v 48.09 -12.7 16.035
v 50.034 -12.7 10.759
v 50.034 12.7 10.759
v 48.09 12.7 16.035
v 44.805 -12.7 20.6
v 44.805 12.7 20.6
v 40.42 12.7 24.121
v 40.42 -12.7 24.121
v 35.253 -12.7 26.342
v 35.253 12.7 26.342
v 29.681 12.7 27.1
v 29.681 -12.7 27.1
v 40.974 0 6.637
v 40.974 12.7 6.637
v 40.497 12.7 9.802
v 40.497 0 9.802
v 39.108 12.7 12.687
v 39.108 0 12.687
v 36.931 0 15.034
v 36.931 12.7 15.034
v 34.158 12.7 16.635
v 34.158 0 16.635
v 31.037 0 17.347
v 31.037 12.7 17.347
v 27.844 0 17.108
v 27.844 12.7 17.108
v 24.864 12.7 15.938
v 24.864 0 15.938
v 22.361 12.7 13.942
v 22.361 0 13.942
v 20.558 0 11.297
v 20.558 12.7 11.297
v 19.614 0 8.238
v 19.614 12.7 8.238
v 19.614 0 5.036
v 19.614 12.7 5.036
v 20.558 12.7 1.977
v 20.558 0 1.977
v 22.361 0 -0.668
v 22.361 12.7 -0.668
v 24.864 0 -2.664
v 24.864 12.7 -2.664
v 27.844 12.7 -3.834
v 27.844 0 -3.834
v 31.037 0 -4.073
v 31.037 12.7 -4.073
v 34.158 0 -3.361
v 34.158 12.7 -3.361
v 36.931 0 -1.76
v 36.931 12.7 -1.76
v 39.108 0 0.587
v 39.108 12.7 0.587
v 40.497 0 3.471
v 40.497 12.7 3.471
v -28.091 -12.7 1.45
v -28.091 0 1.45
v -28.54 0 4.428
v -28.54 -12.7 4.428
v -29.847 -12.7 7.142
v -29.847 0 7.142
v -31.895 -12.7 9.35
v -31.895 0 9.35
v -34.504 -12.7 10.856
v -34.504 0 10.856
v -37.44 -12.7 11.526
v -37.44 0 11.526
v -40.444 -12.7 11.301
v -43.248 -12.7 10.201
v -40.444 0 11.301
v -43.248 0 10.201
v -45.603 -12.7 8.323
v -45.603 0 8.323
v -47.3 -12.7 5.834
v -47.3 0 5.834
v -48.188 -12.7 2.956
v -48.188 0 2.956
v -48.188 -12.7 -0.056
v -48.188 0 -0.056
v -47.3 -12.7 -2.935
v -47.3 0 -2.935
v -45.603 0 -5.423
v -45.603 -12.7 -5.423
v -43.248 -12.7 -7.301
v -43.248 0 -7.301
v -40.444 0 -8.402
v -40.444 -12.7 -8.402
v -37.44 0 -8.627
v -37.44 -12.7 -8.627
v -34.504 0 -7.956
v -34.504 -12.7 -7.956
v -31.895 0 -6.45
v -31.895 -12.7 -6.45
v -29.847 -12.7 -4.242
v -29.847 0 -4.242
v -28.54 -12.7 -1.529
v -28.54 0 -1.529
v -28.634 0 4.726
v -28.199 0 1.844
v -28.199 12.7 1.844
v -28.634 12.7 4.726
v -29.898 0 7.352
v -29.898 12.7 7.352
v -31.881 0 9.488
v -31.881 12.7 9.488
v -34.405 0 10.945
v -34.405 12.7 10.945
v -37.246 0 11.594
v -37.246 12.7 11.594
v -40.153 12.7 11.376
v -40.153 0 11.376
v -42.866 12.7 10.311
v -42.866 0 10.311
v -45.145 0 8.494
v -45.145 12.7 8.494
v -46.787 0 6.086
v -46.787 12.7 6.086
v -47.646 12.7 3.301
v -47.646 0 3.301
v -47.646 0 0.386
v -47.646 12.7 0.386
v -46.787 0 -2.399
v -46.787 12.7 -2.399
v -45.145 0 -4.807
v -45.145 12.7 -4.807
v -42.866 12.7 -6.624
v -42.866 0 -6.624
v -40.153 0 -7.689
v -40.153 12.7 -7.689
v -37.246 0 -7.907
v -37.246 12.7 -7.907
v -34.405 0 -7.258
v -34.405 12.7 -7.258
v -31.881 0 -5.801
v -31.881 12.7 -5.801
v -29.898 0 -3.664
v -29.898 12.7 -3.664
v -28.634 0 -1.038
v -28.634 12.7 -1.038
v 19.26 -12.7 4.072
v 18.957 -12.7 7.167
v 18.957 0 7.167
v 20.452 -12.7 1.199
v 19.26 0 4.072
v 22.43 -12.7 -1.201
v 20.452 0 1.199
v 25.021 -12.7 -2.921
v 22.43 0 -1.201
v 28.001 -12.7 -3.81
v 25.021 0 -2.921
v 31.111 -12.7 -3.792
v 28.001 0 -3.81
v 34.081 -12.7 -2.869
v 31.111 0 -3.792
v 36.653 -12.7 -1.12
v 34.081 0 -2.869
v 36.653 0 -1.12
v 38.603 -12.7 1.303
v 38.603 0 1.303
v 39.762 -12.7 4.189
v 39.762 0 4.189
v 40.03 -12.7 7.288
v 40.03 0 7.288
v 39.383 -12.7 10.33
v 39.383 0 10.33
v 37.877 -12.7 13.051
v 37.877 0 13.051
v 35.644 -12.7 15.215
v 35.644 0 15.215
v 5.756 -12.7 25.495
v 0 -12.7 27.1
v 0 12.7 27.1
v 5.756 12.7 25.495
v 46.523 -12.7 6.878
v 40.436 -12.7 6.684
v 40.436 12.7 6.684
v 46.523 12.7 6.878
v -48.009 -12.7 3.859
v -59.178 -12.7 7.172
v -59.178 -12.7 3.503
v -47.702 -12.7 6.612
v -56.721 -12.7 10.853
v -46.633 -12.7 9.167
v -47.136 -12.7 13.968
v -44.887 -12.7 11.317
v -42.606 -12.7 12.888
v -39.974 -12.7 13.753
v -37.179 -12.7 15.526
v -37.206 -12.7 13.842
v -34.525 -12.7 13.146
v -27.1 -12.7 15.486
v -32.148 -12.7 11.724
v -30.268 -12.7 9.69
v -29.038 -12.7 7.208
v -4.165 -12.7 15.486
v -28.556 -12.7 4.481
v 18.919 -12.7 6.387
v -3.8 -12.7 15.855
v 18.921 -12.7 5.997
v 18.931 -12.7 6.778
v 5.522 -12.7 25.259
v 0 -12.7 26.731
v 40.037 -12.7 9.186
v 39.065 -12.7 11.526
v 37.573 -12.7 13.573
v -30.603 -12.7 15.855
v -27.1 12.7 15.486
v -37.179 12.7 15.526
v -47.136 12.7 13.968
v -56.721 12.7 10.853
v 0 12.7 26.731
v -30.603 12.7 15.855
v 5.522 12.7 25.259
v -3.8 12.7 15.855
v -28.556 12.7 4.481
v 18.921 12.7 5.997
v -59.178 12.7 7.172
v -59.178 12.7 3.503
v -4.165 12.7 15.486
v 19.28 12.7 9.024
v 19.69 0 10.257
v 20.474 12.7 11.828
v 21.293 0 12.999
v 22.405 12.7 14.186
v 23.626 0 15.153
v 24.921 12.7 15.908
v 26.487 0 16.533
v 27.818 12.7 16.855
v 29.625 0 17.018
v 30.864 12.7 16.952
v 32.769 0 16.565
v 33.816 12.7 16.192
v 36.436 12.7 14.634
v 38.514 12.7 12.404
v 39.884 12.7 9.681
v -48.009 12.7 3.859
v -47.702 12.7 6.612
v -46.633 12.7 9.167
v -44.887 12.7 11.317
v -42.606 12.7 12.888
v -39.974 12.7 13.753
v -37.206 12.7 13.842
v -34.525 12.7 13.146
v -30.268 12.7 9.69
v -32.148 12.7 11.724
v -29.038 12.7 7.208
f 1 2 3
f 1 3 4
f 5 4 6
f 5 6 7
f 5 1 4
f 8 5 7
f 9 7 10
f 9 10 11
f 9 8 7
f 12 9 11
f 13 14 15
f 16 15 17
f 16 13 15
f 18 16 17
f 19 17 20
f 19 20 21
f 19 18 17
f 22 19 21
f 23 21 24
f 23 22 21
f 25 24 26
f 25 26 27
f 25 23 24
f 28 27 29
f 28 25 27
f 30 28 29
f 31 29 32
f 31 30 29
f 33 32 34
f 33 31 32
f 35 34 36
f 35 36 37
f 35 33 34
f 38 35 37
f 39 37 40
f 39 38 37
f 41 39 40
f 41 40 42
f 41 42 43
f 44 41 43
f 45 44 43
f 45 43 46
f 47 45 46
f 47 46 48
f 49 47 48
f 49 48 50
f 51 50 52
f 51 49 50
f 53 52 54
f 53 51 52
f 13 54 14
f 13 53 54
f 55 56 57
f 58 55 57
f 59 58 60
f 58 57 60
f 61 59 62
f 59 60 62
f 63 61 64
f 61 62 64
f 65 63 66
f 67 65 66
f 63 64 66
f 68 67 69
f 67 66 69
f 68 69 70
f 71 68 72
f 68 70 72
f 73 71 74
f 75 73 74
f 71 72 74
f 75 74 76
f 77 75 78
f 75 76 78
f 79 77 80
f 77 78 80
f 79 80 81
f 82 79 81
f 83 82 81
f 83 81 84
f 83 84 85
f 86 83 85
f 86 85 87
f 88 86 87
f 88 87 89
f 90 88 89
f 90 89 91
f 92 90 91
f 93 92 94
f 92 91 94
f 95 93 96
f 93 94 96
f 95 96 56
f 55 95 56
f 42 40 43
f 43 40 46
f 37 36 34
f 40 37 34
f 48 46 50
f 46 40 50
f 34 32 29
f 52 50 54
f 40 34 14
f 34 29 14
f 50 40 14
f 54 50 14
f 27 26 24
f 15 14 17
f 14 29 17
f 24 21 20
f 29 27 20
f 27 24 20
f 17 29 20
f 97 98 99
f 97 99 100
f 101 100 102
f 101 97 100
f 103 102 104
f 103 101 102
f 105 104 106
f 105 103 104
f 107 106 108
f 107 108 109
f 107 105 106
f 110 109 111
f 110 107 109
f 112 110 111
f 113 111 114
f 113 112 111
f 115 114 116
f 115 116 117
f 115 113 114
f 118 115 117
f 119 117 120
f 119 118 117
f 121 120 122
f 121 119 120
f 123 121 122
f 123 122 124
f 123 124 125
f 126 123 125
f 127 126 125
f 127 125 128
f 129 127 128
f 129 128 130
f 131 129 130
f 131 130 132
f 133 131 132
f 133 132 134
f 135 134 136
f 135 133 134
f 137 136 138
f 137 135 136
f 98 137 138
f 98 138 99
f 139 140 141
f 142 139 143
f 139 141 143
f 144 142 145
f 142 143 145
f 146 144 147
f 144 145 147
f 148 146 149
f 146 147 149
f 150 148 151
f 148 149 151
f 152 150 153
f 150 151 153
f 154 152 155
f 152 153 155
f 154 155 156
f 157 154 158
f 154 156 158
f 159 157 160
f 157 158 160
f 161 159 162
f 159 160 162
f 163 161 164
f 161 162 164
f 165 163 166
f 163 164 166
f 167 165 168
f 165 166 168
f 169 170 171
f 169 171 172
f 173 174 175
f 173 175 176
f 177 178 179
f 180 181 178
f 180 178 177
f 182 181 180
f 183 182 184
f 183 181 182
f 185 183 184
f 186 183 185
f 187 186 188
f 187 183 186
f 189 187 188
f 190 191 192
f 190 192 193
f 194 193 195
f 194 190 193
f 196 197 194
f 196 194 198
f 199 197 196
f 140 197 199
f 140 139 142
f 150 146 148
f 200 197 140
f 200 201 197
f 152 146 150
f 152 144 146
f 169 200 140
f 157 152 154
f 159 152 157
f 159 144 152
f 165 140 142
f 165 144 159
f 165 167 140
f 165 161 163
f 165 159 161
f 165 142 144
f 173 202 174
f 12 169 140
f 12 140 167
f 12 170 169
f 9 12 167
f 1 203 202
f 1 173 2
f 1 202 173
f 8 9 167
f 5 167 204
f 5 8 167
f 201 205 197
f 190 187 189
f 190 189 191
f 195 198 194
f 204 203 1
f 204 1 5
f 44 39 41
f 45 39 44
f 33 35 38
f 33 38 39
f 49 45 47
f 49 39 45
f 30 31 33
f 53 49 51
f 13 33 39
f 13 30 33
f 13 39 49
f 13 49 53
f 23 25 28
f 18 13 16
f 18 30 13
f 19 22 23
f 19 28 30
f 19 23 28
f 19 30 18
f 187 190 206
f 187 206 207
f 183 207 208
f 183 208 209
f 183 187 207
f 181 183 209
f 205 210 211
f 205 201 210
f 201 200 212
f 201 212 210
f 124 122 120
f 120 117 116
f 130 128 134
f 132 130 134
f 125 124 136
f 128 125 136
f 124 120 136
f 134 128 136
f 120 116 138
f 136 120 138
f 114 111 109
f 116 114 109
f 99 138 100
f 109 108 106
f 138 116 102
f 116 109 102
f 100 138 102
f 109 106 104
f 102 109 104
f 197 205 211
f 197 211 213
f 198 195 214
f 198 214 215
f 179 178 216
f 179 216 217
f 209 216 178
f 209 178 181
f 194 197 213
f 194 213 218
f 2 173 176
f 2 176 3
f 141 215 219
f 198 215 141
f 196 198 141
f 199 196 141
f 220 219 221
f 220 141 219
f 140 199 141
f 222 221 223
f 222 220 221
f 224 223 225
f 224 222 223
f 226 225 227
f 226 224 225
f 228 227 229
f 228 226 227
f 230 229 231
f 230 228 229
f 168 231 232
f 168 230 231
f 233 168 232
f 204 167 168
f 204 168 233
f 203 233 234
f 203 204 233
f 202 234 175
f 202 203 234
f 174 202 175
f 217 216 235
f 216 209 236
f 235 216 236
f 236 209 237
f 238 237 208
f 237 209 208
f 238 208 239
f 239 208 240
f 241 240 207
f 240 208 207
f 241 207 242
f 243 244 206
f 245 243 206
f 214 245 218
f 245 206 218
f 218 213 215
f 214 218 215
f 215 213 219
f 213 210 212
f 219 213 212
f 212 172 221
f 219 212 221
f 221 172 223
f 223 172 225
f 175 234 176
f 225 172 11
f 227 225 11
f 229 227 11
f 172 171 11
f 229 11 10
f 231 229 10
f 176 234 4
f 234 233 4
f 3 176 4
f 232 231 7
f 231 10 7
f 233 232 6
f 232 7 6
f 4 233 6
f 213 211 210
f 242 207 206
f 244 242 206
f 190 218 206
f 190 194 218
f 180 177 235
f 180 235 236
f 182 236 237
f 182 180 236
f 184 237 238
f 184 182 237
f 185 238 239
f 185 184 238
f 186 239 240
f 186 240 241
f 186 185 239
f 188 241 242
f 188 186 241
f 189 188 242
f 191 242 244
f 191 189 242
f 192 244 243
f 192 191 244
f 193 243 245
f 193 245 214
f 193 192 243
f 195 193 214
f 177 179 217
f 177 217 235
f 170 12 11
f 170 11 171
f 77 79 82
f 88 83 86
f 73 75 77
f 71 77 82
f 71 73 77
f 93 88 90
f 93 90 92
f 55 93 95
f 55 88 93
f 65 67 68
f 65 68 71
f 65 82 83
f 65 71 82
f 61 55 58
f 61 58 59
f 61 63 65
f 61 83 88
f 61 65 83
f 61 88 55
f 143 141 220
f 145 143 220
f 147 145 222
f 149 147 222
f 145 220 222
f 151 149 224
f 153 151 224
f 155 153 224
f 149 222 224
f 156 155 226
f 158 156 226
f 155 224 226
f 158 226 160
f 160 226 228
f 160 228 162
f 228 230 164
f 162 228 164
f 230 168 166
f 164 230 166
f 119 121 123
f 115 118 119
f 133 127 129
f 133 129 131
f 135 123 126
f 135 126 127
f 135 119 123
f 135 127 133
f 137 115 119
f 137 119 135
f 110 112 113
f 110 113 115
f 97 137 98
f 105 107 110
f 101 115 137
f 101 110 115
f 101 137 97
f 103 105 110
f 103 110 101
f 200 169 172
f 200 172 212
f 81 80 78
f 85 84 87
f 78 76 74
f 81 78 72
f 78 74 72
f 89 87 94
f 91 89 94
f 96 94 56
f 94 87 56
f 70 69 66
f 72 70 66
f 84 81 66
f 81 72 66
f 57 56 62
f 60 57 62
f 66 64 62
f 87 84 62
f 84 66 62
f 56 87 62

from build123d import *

# Parameters (mm, degrees)
F1_DEPTH     = 12.7
F2_R         = 10.1047698041
F3_DEPTH     = 12.7
F4_R         = 10.5534100151
F5_DEPTH     = 12.7
F6_R         = 10.7401525204
F7_DEPTH     = 12.7
F6_R_2       = 9.7777609661
F9_DEPTH     = 12.7
F10_T1_DEPTH = 39.2535672139


# Not quite as in the source:
# - a fillet or chamfer that OpenCascade refuses, or shapes differently, is made with other operations: its cross-section is extruded or revolved along the edge and cut away or added


with BuildPart() as f1:
    # F0 (on Front) → F1 (new body, symmetric)
    with BuildSketch(Plane.XZ):
        with BuildLine():
            Line((-59.1779053211, 9.7708068788), (-59.1779053211, 3.5027421545))
            Line((-59.1779053211, 3.5027421545), (-48.0088856633, 3.8593999503))
            ThreePointArc((-48.0088856633, 3.8593999503), (-38.5930774629, 13.8963899871), (-28.5560874262, 4.4805817867))
            Line((-28.5560874262, 4.4805817867), (18.9210229876, 5.9966576886))
            ThreePointArc((18.9210229876, 5.9966576886), (29.3376039545, 17.0122475888), (40.4357630105, 6.6836830489))
            Line((40.4357630105, 6.6836830489), (46.5228520607, 6.8780606962))
            Line((46.5228520607, 6.8780606962), (50.0343405137, 10.7586279268))
            ThreePointArc((50.0343405137, 10.7586279268), (42.7319803073, 22.5092393875), (29.6811275184, 27.1001625806))
            Line((29.6811275184, 27.1001625806), (0, 27.1001625806))
            Line((0, 27.1001625806), (5.7562123984, 25.495192036))
            Line((5.7562123984, 25.495192036), (-4.165281076, 15.4858063906))
            Line((-4.165281076, 15.4858063906), (-27.1001625806, 15.4858063906))
            ThreePointArc((-27.1001625806, 15.4858063906), (-43.5123592841, 14.7237458338), (-59.1779053211, 9.7708068788))
        make_face()
    extrude(amount=F1_DEPTH, both=True)

    # F4 (on Front) → F5 (join)
    with BuildSketch(Plane.XZ):
        with Locations((29.4967759401, 6.6367746331)):
            Circle(F4_R)
    extrude(amount=F5_DEPTH)

    # F8 (on Front) → F9 (join, symmetric)
    with BuildSketch(Plane.XZ):
        Polygon((0, 26.7314519733), (-30.6029040366, 15.8545169979), (-3.687096294, 15.8545169979), (5.5306460708, 25.2566132694), align=None)
    extrude(amount=F9_DEPTH, both=True)

    # F10: chamfer of 2.54 on 1 edges, made by hand

    # F10_s2 → F10_t1 (cut)
    with BuildSketch(Plane.XZ.offset(-19.6267836069)):
        with BuildLine():
            Line((-59.2343048388, 7.087548982), (-56.66484646, 10.9375922673))
            Line((-56.66484646, 10.9375922673), (-56.6843383341, 10.9845039593))
            ThreePointArc((-56.6843383341, 10.9845039593), (-57.9365490789, 10.3887043259), (-59.1993652191, 9.8168515612))
            Line((-59.1993652191, 9.8168515612), (-59.2287053211, 9.7708068788))
            ThreePointArc((-59.2287053211, 9.7708068788), (-59.2287053211, 8.4291779304), (-59.2851048388, 7.087548982))
            Line((-59.2851048388, 7.087548982), (-59.2343048388, 7.087548982))
        make_face()
    extrude(amount=F10_T1_DEPTH, mode=Mode.SUBTRACT)


with BuildPart() as f3:
    # F2 (on Front) → F3 (new body)
    with BuildSketch(Plane.XZ):
        with Locations((-38.195622816, 1.4497848184)):
            Circle(F2_R)
    extrude(amount=F3_DEPTH)


with BuildPart() as f7:
    # F6 (on Front) → F7 (new body)
    with BuildSketch(Plane.XZ):
        with Locations((30.234195292, 6.6367746331)):
            Circle(F6_R)
    extrude(amount=-F7_DEPTH)


with BuildPart() as f7b:
    # F6 (on Front) → F7, piece 2 (new body)
    with BuildSketch(Plane.XZ):
        with Locations((-37.9770956933, 1.8435484963)):
            Circle(F6_R_2)
    extrude(amount=-F7_DEPTH)


solid = Compound([f1.part, f3.part, f7.part, f7b.part])
